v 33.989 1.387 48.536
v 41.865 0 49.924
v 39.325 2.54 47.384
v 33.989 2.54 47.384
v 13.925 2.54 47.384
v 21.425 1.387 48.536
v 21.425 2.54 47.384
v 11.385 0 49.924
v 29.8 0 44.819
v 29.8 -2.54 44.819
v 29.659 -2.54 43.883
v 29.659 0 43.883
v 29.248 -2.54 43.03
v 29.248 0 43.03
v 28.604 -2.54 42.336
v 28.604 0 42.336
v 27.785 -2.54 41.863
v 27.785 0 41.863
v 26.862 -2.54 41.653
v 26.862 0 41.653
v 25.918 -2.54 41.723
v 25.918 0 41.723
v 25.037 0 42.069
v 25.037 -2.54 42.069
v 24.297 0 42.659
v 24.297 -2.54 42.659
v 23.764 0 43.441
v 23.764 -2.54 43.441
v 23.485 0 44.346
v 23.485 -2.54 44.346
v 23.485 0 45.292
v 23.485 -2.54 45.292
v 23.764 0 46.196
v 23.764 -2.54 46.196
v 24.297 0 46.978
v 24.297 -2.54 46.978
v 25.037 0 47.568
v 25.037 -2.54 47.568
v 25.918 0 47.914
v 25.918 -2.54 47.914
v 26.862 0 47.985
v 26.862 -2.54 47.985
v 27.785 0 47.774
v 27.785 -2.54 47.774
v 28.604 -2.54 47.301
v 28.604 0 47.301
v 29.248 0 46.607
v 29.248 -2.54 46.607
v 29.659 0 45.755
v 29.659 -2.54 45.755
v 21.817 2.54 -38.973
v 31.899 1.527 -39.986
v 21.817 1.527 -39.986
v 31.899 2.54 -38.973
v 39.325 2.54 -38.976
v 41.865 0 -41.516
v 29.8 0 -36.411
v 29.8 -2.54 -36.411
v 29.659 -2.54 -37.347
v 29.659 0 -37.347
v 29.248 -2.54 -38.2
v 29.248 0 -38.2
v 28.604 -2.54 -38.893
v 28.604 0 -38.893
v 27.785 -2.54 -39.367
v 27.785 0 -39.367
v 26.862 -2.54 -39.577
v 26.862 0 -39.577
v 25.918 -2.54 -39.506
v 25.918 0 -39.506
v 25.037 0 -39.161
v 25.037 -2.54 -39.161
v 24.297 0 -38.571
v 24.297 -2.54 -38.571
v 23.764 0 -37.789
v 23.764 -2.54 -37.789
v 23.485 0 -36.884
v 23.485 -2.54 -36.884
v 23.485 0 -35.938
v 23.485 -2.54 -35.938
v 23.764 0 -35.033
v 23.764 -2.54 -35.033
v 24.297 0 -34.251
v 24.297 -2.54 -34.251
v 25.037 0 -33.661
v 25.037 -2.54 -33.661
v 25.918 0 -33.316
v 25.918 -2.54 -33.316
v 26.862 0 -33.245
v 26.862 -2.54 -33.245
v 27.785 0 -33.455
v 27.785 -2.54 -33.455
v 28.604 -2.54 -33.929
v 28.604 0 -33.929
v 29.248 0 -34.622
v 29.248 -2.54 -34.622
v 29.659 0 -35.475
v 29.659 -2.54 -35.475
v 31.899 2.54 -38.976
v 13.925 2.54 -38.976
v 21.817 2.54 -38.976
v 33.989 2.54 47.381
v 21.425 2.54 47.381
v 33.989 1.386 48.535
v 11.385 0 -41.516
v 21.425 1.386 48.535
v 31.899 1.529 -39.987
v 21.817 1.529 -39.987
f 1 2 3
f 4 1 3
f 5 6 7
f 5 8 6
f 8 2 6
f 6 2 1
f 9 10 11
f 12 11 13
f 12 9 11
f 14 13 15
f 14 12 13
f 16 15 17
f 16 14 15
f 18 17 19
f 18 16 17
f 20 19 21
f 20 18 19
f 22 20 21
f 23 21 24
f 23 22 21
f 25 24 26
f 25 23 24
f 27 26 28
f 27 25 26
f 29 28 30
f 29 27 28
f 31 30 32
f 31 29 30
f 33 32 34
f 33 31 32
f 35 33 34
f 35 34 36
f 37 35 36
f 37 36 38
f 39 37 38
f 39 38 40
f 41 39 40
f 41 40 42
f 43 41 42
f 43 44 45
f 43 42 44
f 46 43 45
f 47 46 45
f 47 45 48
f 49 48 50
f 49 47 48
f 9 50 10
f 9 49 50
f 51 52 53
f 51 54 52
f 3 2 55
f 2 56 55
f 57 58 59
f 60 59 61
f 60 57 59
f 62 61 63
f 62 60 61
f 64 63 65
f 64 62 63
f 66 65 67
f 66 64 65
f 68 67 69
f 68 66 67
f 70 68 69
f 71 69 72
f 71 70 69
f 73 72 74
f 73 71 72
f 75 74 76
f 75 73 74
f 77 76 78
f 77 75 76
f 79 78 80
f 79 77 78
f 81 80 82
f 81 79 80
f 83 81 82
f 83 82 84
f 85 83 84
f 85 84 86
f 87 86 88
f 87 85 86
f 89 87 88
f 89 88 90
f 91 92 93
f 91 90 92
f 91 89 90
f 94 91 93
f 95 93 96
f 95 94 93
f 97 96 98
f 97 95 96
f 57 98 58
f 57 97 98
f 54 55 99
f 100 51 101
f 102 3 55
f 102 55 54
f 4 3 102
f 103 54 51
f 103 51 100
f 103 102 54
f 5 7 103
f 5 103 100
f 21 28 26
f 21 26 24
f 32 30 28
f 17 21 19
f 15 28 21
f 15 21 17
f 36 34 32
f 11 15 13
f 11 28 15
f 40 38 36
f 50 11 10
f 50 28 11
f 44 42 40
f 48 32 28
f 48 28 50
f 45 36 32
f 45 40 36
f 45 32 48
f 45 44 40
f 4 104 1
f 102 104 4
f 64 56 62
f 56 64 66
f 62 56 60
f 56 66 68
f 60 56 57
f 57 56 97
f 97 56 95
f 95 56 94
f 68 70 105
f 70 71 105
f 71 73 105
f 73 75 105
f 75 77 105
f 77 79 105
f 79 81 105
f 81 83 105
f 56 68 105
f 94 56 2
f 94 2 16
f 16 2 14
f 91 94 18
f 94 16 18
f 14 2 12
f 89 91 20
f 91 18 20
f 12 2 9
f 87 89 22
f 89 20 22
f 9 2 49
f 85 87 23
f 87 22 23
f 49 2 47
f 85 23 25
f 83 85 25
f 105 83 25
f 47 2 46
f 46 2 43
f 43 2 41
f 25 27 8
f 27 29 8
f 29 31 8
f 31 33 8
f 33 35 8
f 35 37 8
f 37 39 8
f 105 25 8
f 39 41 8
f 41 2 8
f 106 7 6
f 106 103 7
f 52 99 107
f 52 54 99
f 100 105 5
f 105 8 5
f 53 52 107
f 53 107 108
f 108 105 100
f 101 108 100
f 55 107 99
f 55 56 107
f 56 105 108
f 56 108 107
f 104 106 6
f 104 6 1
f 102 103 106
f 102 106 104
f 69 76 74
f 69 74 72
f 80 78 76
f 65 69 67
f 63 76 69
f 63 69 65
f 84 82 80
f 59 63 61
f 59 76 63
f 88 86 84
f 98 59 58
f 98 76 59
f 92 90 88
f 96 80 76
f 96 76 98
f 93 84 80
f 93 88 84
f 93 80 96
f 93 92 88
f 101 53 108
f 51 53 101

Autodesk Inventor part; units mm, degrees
ref_plane "YZ Plane" through (0, 0, 0) normal (1, 0, 0) x (0, 1, 0)
ref_plane "XZ Plane" through (0, 0, 0) normal (0, 1, 0) x (-1, 0, 0)
ref_plane "XY Plane" through (0, 0, 0) normal (0, 0, 1) x (1, 0, 0)
sketch "Sketch1" plane through (0, 0, 0) normal (0, 1, 0) x (-1, 0, 0)
  line L0 (-21.4179, -39.4841) -> (-21.4179, -33.3379)
  line L1 (-21.4179, -33.3379) -> (-13.4169, -33.3379)
  line L2 (-13.4169, -33.3379) -> (-13.4169, -39.4841)
  line L3 (-13.4169, -39.4841) -> (-21.4179, -39.4841)
  line L4 (-21.4179, 41.7458) -> (-21.4179, 47.8919)
  line L5 (-21.4179, 47.8919) -> (-13.4169, 47.8919)
  line L6 (-13.4169, 47.8919) -> (-13.4169, 41.7458)
  line L7 (-13.4169, 41.7458) -> (-21.4179, 41.7458)
  circle A0 centre (-26.6249, -36.411) radius 3.175
  circle A1 centre (-26.6249, 44.8188) radius 3.175
  line L8 (-31.8319, 47.8919) -> (-31.8319, 41.7458)
  line L9 (-31.8319, 41.7458) -> (-39.8329, 41.7458)
  line L10 (-39.8329, 41.7458) -> (-39.8329, 47.8919)
  line L11 (-39.8329, 47.8919) -> (-31.8319, 47.8919)
  line L12 (-31.8319, -33.3379) -> (-31.8319, -39.4841)
  line L13 (-31.8319, -39.4841) -> (-39.8329, -39.4841)
  line L14 (-39.8329, -39.4841) -> (-39.8329, -33.3379)
  line L15 (-39.8329, -33.3379) -> (-31.8319, -33.3379)
  line L16 (-41.8649, 3.1879) -> (-27.6409, 3.1879)
  line L17 (-27.6409, 3.1879) -> (-27.6409, -6.9721)
  line L18 (-27.6409, -6.9721) -> (-41.8649, -6.9721)
  line L19 (-41.8649, -6.9721) -> (-41.8649, -9.0041)
  line L20 (-41.8649, -9.0041) -> (-27.6409, -9.0041)
  line L21 (-27.6409, -9.0041) -> (-27.6409, -19.1641)
  line L22 (-27.6409, -19.1641) -> (-41.8649, -19.1641)
  line L23 (-41.8649, -19.1641) -> (-41.8649, -21.1961)
  line L24 (-41.8649, -21.1961) -> (-27.6409, -21.1961)
  line L25 (-27.6409, -21.1961) -> (-27.6409, -31.3561)
  line L26 (-27.6409, -31.3561) -> (-41.8649, -31.3561)
  line L27 (-41.8649, -31.3561) -> (-41.8649, -41.5161)
  line L28 (-41.8649, -41.5161) -> (-11.3849, -41.5161)
  line L29 (-11.3849, -41.5161) -> (-11.3849, -31.3561)
  line L30 (-11.3849, -31.3561) -> (-25.6089, -31.3561)
  line L31 (-25.6089, -31.3561) -> (-25.6089, -21.1961)
  line L32 (-25.6089, -21.1961) -> (-11.3849, -21.1961)
  line L33 (-11.3849, -21.1961) -> (-11.3849, -19.1641)
  line L34 (-11.3849, -19.1641) -> (-25.6089, -19.1641)
  line L35 (-25.6089, -19.1641) -> (-25.6089, -9.0041)
  line L36 (-25.6089, -9.0041) -> (-11.3849, -9.0041)
  line L37 (-11.3849, -9.0041) -> (-11.3849, -6.9721)
  line L38 (-11.3849, -6.9721) -> (-25.6089, -6.9721)
  line L39 (-25.6089, -6.9721) -> (-25.6089, 3.1879)
  line L40 (-25.6089, 3.1879) -> (-11.3849, 3.1879)
  line L41 (-11.3849, 3.1879) -> (-11.3849, 5.2199)
  line L42 (-11.3849, 5.2199) -> (-25.6089, 5.2199)
  line L43 (-25.6089, 5.2199) -> (-25.6089, 15.3799)
  line L44 (-25.6089, 15.3799) -> (-11.3849, 15.3799)
  line L45 (-11.3849, 15.3799) -> (-11.3849, 17.4119)
  line L46 (-11.3849, 17.4119) -> (-25.6089, 17.4119)
  line L47 (-25.6089, 17.4119) -> (-25.6089, 27.5719)
  line L48 (-25.6089, 27.5719) -> (-11.3849, 27.5719)
  line L49 (-11.3849, 27.5719) -> (-11.3849, 29.6039)
  line L50 (-11.3849, 29.6039) -> (-25.6089, 29.6039)
  line L51 (-25.6089, 29.6039) -> (-25.6089, 39.7639)
  line L52 (-25.6089, 39.7639) -> (-11.3849, 39.7639)
  line L53 (-11.3849, 39.7639) -> (-11.3849, 49.9239)
  line L54 (-11.3849, 49.9239) -> (-41.8649, 49.9239)
  line L55 (-41.8649, 49.9239) -> (-41.8649, 39.7639)
  line L56 (-41.8649, 39.7639) -> (-27.6409, 39.7639)
  line L57 (-27.6409, 39.7639) -> (-27.6409, 29.6039)
  line L58 (-27.6409, 29.6039) -> (-41.8649, 29.6039)
  line L59 (-41.8649, 29.6039) -> (-41.8649, 27.5719)
  line L60 (-41.8649, 27.5719) -> (-27.6409, 27.5719)
  line L61 (-27.6409, 27.5719) -> (-27.6409, 17.4119)
  line L62 (-27.6409, 17.4119) -> (-41.8649, 17.4119)
  line L63 (-41.8649, 17.4119) -> (-41.8649, 15.3799)
  line L64 (-41.8649, 15.3799) -> (-27.6409, 15.3799)
  line L65 (-27.6409, 15.3799) -> (-27.6409, 5.2199)
  line L66 (-27.6409, 5.2199) -> (-41.8649, 5.2199)
  line L67 (-41.8649, 5.2199) -> (-41.8649, 3.1879)
  line L68 (-11.3849, -31.3561) -> (-11.3849, 39.7639)
  line L69 (-41.8649, 39.7639) -> (-41.8649, -31.3561)
  point P0 (0, 0)
extrude "Extrusion1" add sketch "Sketch1" along normal blind 2.54 contours L0 L1 L2 L3 | L4 L5 L6 L7 | L8 L9 L10 L11 | L12 L13 L14 L15 | L67 L66 L65 L64 L63 L62 L61 L60 L59 L58 L57 L56 L55 L54 L53 L52 L51 L50 L49 L48 L47 L46 L45 L44 L43 L42 L41 L40 L39 L38 L37 L36 L35 L34 L33 L32 L31 L30 L29 L28 L27 L26 L25 L24 L23 L22 L21 L20 L19 L18 L17 L16 | L16 L17 L18 L69 | L69 L64 L65 L66 | L20 L21 L22 L69 | L69 L60 L61 L62 | L24 L25 L26 L69 | L69 L56 L57 L58 | L30 L31 L32 L68 | L68 L50 L51 L52 | L34 L35 L36 L68 | L68 L46 L47 L48 | L38 L39 L40 L68 | L68 L42 L43 L44
chamfer "Chamfer1" distance 2.54 angle 45 4 edges at (26.6249, 2.54, 49.9239) (41.8649, 2.54, -20.1801) (11.3849, 2.54, -36.4361) (26.6249, 2.54, -41.5161)
sketch "Sketch2" plane through (0, 0, 0) normal (0, -1, 0) x (1, 0, 0)
  circle A0 centre (26.6249, 44.8188) radius 3.175 projected
  circle A1 centre (26.6249, 44.8188) radius 3.175
  circle A2 centre (26.6249, -36.411) radius 3.175 projected
  circle A3 centre (26.6249, -36.411) radius 3.175
  point P0 (0, 0)
extrude "Extrusion2" add sketch "Sketch2" along normal blind 2.54
sketch "Sketch3" plane through (26.6249, 0, 44.8188) normal (0, 1, 0) x (1, 0, 0)
  circle A0 centre (0, 81.2298) radius 3.175 projected
  circle A1 centre (0, 0) radius 3.175 projected
  point P0 (-26.6249, 44.8188)
extrude "Extrusion3" add sketch "Sketch3" along normal blind 2.54
sketch "Sketch4" plane through (11.3849, 0, 49.9239) normal (0, 0.7071068, 0.7071068) x (1, 0, 0)
  line L0 (10.0398, 1.9622) -> (22.6044, 1.9622)
  line L1 (22.6044, 1.9622) -> (22.6044, 6.858)
  line L2 (22.6044, 6.858) -> (10.0398, 6.858)
  line L3 (10.0398, 6.858) -> (10.0398, 1.9622)
  point P0 (-11.3849, 35.3015)
extrude "Extrusion4" cut sketch "Sketch4" along normal blind 2.54
sketch "Sketch5" plane through (41.8649, 0, -41.5161) normal (0, 0.7071068, -0.7071068) x (-1, 0, 0)
  line L0 (9.9656, 2.1621) -> (20.0479, 2.1621)
  line L1 (20.0479, 2.1621) -> (20.0479, 4.6266)
  line L2 (20.0479, 4.6266) -> (9.9656, 4.6266)
  line L3 (9.9656, 4.6266) -> (9.9656, 2.1621)
  point P0 (41.8649, 29.3563)
extrude "Extrusion5" cut sketch "Sketch5" along normal blind 2.54
properties part number "TerminalBlockLid"
